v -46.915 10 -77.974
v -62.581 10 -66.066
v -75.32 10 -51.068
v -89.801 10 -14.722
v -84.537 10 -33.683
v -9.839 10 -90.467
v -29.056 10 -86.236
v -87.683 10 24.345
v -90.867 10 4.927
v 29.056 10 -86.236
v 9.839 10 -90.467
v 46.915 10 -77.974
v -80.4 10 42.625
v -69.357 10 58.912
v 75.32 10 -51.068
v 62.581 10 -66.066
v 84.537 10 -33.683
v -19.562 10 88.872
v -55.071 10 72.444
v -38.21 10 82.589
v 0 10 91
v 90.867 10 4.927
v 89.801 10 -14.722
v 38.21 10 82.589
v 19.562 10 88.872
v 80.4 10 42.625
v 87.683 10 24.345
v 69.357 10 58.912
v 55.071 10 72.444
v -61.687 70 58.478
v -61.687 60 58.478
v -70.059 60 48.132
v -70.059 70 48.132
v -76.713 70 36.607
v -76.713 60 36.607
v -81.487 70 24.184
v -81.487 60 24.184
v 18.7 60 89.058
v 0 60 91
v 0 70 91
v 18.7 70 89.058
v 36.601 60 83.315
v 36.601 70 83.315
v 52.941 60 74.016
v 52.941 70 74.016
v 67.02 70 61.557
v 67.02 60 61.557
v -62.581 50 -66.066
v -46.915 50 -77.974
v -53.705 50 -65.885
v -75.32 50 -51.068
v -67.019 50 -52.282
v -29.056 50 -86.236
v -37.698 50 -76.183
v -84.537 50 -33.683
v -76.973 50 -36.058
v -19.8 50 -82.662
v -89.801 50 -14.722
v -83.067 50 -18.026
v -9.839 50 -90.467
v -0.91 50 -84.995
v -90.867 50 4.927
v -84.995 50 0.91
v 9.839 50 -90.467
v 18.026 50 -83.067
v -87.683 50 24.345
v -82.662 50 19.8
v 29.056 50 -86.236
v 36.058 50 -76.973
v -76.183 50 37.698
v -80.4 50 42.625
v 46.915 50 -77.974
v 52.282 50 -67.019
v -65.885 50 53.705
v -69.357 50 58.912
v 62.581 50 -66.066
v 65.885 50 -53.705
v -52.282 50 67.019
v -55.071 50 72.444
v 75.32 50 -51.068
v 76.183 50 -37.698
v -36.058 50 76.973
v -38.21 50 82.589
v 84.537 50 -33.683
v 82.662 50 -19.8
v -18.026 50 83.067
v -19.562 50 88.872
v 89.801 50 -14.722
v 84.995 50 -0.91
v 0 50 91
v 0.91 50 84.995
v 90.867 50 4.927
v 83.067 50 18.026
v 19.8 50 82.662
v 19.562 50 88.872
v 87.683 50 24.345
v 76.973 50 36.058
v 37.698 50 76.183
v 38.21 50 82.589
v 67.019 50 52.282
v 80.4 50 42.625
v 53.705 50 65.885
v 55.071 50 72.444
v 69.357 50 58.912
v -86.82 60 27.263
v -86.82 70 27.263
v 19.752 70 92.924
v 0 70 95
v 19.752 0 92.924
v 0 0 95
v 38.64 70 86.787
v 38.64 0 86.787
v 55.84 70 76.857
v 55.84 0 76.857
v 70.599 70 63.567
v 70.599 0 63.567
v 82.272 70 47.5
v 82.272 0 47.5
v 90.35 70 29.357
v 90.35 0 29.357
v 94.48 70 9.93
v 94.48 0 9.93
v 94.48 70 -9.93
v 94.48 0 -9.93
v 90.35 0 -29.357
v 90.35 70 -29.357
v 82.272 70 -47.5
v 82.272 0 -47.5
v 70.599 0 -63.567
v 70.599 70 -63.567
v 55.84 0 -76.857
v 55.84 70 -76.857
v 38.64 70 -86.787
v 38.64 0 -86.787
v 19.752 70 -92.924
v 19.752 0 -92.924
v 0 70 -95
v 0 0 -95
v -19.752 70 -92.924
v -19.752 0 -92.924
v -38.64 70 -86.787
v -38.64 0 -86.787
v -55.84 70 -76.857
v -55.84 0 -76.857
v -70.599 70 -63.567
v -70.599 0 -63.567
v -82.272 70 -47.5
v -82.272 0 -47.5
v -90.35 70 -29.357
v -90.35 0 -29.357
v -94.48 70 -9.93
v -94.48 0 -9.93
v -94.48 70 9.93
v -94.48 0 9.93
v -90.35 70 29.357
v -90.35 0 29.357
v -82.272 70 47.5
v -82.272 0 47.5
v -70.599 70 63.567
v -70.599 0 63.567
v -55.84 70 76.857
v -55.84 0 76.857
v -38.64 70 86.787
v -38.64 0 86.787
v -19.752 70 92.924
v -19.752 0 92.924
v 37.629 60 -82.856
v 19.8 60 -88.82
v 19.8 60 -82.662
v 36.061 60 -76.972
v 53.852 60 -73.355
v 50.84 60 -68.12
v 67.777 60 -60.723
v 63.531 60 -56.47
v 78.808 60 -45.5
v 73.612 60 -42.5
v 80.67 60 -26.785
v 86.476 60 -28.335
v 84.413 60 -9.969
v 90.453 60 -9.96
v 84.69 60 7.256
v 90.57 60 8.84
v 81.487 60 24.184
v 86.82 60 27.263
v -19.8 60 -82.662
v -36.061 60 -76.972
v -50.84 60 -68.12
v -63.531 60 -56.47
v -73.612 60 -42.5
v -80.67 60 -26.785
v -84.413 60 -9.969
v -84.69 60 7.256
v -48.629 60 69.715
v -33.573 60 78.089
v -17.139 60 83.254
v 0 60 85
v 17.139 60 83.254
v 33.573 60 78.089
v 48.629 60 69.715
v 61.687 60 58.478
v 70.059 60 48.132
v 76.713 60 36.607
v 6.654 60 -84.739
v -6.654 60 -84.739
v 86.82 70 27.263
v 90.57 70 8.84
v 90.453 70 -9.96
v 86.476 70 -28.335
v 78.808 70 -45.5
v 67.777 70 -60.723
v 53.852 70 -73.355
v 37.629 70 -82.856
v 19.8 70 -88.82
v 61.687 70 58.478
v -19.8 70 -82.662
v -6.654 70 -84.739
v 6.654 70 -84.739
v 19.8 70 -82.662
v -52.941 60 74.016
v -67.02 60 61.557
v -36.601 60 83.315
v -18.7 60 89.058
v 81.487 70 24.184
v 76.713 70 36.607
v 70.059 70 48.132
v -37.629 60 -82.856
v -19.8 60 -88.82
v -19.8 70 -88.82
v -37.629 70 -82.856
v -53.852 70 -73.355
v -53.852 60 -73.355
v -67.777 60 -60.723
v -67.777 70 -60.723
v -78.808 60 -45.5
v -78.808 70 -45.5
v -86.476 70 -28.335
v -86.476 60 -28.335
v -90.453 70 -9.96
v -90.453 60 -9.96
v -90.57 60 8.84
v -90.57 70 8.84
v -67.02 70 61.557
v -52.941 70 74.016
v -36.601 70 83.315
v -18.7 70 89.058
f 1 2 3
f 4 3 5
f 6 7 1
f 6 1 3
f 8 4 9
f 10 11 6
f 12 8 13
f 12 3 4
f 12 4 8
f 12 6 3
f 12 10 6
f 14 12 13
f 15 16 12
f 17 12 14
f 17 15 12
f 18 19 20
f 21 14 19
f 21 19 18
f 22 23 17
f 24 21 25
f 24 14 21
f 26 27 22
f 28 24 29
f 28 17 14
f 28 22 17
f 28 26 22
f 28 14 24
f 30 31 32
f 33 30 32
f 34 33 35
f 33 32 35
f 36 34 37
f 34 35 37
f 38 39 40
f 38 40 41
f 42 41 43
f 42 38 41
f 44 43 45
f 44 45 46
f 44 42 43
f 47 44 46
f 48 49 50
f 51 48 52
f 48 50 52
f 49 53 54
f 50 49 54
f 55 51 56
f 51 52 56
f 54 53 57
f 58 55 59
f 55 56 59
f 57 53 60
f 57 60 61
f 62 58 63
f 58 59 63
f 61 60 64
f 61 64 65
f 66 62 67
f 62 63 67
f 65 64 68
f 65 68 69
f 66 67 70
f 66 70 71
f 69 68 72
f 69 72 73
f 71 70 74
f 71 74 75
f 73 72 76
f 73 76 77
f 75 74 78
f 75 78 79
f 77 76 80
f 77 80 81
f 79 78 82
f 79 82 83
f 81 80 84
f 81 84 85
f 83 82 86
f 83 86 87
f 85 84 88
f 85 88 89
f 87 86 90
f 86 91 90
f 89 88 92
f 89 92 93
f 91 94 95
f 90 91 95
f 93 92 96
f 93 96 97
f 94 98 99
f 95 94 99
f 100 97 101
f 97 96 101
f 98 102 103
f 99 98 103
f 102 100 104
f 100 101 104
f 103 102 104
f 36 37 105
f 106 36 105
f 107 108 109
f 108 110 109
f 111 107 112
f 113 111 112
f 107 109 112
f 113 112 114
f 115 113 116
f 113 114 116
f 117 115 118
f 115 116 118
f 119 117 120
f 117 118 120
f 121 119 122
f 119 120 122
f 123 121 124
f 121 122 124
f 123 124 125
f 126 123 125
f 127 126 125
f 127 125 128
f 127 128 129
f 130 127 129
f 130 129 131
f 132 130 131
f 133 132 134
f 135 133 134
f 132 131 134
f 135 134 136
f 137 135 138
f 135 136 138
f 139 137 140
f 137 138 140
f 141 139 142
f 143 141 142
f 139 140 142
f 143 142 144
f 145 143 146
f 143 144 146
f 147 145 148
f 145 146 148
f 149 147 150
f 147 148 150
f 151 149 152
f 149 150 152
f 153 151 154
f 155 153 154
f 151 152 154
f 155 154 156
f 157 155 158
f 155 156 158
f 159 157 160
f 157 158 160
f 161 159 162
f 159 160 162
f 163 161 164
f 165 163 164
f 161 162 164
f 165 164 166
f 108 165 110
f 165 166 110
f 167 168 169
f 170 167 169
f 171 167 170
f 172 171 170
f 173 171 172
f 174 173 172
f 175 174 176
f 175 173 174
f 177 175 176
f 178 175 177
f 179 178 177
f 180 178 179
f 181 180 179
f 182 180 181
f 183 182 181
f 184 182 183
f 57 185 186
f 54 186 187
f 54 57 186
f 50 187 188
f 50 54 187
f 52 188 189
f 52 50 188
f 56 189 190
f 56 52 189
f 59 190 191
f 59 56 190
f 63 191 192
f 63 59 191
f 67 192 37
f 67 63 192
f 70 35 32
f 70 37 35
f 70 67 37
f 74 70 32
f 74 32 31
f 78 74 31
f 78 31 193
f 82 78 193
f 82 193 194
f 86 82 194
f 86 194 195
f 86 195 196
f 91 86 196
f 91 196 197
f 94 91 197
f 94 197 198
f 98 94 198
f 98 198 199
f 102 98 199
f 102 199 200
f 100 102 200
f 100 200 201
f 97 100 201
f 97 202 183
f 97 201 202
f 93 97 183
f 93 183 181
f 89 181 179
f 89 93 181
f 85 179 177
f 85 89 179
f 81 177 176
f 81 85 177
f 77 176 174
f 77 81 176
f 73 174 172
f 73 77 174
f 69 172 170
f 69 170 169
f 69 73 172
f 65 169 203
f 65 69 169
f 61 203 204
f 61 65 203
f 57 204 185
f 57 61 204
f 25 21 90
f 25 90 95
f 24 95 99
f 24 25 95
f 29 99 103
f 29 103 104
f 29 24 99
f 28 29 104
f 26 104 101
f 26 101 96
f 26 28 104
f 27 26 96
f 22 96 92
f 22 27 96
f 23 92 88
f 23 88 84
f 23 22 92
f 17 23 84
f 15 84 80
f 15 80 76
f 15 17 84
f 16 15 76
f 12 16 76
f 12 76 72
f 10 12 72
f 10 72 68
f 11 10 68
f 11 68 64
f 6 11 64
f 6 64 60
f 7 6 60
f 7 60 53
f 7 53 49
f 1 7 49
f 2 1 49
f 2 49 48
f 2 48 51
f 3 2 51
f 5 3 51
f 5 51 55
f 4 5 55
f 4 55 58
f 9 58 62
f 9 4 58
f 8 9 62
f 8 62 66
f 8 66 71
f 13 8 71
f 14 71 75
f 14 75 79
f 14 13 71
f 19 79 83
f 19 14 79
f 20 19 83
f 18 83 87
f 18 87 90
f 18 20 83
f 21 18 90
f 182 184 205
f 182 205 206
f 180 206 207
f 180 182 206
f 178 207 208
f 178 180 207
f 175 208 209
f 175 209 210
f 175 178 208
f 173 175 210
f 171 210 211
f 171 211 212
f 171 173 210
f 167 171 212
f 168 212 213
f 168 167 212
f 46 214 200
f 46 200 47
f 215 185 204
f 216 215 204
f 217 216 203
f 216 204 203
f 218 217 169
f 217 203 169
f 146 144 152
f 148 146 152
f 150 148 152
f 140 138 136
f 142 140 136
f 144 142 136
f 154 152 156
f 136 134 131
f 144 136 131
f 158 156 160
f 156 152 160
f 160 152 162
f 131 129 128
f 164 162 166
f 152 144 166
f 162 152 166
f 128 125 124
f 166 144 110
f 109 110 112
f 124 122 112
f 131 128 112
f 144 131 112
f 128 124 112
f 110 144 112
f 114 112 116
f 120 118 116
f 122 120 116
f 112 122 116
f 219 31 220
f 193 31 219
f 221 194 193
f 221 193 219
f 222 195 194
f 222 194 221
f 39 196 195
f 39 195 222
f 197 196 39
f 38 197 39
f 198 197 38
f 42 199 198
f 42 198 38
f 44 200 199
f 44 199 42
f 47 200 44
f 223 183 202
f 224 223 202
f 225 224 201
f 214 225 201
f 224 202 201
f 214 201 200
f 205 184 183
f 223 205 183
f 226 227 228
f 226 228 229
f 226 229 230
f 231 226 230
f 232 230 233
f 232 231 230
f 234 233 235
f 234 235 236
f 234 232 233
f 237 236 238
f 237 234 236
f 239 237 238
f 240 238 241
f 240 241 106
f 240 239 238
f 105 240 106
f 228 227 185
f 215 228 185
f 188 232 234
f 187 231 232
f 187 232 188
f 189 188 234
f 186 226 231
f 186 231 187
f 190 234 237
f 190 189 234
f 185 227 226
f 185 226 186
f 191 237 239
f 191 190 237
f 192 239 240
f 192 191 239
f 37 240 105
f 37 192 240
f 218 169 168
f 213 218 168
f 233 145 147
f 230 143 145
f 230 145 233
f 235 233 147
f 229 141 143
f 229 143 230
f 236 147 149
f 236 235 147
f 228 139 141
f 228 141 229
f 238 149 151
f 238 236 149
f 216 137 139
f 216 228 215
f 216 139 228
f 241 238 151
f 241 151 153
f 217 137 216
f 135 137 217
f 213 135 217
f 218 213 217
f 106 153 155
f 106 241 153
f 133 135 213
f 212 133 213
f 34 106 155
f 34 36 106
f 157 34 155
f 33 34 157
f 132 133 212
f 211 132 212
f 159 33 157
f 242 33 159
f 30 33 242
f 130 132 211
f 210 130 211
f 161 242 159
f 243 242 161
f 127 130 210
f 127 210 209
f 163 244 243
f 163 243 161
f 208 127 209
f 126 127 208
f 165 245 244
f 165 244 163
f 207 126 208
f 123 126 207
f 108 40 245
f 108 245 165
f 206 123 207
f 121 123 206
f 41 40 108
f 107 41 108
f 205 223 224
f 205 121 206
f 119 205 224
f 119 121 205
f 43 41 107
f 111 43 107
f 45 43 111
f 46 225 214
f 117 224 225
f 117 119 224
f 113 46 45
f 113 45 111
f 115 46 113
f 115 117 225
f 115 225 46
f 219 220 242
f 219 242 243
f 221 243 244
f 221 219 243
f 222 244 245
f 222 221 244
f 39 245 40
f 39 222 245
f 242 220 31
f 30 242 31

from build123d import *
from build123d.topology import SkipClean

# Parameters (mm, degrees)
CROQUIS1_R               = 95
SALIENTE_EXTRUIR1_DEPTH  = 10
CROQUIS3_R               = 95
CROQUIS3_R_2             = 91
SALIENTE_EXTRUIR2_DEPTH  = 60
SALIENTE_EXTRUIR10_DEPTH = 10
SALIENTE_EXTRUIR15_START = -10
CROQUIS7_R               = 91
CROQUIS7_R_2             = 85
SALIENTE_EXTRUIR15_DEPTH = 10


with BuildPart() as part:
    # Croquis1 → Saliente-Extruir1 (new body)
    with BuildSketch(Plane(origin=(0, 0, 0), x_dir=(1, 0, 0), z_dir=(0, 1, 0))):
        with Locations(Location((0, 0, 0), (0, 0, 270))):
            Circle(CROQUIS1_R)
    extrude(amount=SALIENTE_EXTRUIR1_DEPTH)

    # Croquis3 → Saliente-Extruir2 (add)
    with BuildSketch(Plane(origin=(0, 10, 0), x_dir=(1, 0, 0), z_dir=(0, 1, 0))):
        with Locations(Location((0, 0, 0), (0, 0, 270))):
            Circle(CROQUIS3_R)
        with Locations(Location((0, 0, 0), (0, 0, 270))):
            Circle(CROQUIS3_R_2, mode=Mode.SUBTRACT)
    extrude(amount=SALIENTE_EXTRUIR2_DEPTH)

    # Croquis4 → Saliente-Extruir10 (add)
    with BuildSketch(Plane(origin=(0, 60, 0), x_dir=(1, 0, 0), z_dir=(0, 1, 0))):
        with BuildLine():
            Line((-81.487149685, -24.183557146), (-86.820218408, -27.262605809))
            ThreePointArc((-86.820218408, -27.262605809), (-78.808311744, -45.5), (-67.020218408, -61.557211799))
            Line((-67.020218408, -61.557211799), (-61.687149685, -58.478163136))
            ThreePointArc((-61.687149685, -58.478163136), (-73.612159322, -42.5), (-81.487149685, -24.183557146))
        make_face()
        with BuildLine():
            Line((61.687149685, -58.478163136), (67.020218408, -61.557211799))
            ThreePointArc((67.020218408, -61.557211799), (78.808311744, -45.5), (86.820218408, -27.262605809))
            Line((86.820218408, -27.262605809), (81.487149685, -24.183557146))
            ThreePointArc((81.487149685, -24.183557146), (73.612159322, -42.5), (61.687149685, -58.478163136))
        make_face()
        with BuildLine():
            ThreePointArc((19.8, 88.819817608), (0, 91), (-19.8, 88.819817608))
            Line((-19.8, 88.819817608), (-19.8, 82.661720282))
            ThreePointArc((-19.8, 82.661720282), (0, 85), (19.8, 82.661720282))
            Line((19.8, 82.661720282), (19.8, 88.819817608))
        make_face()
    extrude(amount=SALIENTE_EXTRUIR10_DEPTH)

    # Croquis7 → Saliente-Extruir15 (add)
    with SkipClean():  # the faces are left unmerged after this step: merging them gives an invalid solid
        with BuildSketch(Plane(origin=(0, 60, 0), x_dir=(1, 0, 0), z_dir=(0, 1, 0)).offset(SALIENTE_EXTRUIR15_START)):
            with Locations(Location((0, 0, 0), (0, 0, 270))):
                Circle(CROQUIS7_R)
            with Locations(Location((0, 0, 0), (0, 0, 103.470293186))):
                Circle(CROQUIS7_R_2, mode=Mode.SUBTRACT)
        extrude(amount=SALIENTE_EXTRUIR15_DEPTH)


solid = part.part
